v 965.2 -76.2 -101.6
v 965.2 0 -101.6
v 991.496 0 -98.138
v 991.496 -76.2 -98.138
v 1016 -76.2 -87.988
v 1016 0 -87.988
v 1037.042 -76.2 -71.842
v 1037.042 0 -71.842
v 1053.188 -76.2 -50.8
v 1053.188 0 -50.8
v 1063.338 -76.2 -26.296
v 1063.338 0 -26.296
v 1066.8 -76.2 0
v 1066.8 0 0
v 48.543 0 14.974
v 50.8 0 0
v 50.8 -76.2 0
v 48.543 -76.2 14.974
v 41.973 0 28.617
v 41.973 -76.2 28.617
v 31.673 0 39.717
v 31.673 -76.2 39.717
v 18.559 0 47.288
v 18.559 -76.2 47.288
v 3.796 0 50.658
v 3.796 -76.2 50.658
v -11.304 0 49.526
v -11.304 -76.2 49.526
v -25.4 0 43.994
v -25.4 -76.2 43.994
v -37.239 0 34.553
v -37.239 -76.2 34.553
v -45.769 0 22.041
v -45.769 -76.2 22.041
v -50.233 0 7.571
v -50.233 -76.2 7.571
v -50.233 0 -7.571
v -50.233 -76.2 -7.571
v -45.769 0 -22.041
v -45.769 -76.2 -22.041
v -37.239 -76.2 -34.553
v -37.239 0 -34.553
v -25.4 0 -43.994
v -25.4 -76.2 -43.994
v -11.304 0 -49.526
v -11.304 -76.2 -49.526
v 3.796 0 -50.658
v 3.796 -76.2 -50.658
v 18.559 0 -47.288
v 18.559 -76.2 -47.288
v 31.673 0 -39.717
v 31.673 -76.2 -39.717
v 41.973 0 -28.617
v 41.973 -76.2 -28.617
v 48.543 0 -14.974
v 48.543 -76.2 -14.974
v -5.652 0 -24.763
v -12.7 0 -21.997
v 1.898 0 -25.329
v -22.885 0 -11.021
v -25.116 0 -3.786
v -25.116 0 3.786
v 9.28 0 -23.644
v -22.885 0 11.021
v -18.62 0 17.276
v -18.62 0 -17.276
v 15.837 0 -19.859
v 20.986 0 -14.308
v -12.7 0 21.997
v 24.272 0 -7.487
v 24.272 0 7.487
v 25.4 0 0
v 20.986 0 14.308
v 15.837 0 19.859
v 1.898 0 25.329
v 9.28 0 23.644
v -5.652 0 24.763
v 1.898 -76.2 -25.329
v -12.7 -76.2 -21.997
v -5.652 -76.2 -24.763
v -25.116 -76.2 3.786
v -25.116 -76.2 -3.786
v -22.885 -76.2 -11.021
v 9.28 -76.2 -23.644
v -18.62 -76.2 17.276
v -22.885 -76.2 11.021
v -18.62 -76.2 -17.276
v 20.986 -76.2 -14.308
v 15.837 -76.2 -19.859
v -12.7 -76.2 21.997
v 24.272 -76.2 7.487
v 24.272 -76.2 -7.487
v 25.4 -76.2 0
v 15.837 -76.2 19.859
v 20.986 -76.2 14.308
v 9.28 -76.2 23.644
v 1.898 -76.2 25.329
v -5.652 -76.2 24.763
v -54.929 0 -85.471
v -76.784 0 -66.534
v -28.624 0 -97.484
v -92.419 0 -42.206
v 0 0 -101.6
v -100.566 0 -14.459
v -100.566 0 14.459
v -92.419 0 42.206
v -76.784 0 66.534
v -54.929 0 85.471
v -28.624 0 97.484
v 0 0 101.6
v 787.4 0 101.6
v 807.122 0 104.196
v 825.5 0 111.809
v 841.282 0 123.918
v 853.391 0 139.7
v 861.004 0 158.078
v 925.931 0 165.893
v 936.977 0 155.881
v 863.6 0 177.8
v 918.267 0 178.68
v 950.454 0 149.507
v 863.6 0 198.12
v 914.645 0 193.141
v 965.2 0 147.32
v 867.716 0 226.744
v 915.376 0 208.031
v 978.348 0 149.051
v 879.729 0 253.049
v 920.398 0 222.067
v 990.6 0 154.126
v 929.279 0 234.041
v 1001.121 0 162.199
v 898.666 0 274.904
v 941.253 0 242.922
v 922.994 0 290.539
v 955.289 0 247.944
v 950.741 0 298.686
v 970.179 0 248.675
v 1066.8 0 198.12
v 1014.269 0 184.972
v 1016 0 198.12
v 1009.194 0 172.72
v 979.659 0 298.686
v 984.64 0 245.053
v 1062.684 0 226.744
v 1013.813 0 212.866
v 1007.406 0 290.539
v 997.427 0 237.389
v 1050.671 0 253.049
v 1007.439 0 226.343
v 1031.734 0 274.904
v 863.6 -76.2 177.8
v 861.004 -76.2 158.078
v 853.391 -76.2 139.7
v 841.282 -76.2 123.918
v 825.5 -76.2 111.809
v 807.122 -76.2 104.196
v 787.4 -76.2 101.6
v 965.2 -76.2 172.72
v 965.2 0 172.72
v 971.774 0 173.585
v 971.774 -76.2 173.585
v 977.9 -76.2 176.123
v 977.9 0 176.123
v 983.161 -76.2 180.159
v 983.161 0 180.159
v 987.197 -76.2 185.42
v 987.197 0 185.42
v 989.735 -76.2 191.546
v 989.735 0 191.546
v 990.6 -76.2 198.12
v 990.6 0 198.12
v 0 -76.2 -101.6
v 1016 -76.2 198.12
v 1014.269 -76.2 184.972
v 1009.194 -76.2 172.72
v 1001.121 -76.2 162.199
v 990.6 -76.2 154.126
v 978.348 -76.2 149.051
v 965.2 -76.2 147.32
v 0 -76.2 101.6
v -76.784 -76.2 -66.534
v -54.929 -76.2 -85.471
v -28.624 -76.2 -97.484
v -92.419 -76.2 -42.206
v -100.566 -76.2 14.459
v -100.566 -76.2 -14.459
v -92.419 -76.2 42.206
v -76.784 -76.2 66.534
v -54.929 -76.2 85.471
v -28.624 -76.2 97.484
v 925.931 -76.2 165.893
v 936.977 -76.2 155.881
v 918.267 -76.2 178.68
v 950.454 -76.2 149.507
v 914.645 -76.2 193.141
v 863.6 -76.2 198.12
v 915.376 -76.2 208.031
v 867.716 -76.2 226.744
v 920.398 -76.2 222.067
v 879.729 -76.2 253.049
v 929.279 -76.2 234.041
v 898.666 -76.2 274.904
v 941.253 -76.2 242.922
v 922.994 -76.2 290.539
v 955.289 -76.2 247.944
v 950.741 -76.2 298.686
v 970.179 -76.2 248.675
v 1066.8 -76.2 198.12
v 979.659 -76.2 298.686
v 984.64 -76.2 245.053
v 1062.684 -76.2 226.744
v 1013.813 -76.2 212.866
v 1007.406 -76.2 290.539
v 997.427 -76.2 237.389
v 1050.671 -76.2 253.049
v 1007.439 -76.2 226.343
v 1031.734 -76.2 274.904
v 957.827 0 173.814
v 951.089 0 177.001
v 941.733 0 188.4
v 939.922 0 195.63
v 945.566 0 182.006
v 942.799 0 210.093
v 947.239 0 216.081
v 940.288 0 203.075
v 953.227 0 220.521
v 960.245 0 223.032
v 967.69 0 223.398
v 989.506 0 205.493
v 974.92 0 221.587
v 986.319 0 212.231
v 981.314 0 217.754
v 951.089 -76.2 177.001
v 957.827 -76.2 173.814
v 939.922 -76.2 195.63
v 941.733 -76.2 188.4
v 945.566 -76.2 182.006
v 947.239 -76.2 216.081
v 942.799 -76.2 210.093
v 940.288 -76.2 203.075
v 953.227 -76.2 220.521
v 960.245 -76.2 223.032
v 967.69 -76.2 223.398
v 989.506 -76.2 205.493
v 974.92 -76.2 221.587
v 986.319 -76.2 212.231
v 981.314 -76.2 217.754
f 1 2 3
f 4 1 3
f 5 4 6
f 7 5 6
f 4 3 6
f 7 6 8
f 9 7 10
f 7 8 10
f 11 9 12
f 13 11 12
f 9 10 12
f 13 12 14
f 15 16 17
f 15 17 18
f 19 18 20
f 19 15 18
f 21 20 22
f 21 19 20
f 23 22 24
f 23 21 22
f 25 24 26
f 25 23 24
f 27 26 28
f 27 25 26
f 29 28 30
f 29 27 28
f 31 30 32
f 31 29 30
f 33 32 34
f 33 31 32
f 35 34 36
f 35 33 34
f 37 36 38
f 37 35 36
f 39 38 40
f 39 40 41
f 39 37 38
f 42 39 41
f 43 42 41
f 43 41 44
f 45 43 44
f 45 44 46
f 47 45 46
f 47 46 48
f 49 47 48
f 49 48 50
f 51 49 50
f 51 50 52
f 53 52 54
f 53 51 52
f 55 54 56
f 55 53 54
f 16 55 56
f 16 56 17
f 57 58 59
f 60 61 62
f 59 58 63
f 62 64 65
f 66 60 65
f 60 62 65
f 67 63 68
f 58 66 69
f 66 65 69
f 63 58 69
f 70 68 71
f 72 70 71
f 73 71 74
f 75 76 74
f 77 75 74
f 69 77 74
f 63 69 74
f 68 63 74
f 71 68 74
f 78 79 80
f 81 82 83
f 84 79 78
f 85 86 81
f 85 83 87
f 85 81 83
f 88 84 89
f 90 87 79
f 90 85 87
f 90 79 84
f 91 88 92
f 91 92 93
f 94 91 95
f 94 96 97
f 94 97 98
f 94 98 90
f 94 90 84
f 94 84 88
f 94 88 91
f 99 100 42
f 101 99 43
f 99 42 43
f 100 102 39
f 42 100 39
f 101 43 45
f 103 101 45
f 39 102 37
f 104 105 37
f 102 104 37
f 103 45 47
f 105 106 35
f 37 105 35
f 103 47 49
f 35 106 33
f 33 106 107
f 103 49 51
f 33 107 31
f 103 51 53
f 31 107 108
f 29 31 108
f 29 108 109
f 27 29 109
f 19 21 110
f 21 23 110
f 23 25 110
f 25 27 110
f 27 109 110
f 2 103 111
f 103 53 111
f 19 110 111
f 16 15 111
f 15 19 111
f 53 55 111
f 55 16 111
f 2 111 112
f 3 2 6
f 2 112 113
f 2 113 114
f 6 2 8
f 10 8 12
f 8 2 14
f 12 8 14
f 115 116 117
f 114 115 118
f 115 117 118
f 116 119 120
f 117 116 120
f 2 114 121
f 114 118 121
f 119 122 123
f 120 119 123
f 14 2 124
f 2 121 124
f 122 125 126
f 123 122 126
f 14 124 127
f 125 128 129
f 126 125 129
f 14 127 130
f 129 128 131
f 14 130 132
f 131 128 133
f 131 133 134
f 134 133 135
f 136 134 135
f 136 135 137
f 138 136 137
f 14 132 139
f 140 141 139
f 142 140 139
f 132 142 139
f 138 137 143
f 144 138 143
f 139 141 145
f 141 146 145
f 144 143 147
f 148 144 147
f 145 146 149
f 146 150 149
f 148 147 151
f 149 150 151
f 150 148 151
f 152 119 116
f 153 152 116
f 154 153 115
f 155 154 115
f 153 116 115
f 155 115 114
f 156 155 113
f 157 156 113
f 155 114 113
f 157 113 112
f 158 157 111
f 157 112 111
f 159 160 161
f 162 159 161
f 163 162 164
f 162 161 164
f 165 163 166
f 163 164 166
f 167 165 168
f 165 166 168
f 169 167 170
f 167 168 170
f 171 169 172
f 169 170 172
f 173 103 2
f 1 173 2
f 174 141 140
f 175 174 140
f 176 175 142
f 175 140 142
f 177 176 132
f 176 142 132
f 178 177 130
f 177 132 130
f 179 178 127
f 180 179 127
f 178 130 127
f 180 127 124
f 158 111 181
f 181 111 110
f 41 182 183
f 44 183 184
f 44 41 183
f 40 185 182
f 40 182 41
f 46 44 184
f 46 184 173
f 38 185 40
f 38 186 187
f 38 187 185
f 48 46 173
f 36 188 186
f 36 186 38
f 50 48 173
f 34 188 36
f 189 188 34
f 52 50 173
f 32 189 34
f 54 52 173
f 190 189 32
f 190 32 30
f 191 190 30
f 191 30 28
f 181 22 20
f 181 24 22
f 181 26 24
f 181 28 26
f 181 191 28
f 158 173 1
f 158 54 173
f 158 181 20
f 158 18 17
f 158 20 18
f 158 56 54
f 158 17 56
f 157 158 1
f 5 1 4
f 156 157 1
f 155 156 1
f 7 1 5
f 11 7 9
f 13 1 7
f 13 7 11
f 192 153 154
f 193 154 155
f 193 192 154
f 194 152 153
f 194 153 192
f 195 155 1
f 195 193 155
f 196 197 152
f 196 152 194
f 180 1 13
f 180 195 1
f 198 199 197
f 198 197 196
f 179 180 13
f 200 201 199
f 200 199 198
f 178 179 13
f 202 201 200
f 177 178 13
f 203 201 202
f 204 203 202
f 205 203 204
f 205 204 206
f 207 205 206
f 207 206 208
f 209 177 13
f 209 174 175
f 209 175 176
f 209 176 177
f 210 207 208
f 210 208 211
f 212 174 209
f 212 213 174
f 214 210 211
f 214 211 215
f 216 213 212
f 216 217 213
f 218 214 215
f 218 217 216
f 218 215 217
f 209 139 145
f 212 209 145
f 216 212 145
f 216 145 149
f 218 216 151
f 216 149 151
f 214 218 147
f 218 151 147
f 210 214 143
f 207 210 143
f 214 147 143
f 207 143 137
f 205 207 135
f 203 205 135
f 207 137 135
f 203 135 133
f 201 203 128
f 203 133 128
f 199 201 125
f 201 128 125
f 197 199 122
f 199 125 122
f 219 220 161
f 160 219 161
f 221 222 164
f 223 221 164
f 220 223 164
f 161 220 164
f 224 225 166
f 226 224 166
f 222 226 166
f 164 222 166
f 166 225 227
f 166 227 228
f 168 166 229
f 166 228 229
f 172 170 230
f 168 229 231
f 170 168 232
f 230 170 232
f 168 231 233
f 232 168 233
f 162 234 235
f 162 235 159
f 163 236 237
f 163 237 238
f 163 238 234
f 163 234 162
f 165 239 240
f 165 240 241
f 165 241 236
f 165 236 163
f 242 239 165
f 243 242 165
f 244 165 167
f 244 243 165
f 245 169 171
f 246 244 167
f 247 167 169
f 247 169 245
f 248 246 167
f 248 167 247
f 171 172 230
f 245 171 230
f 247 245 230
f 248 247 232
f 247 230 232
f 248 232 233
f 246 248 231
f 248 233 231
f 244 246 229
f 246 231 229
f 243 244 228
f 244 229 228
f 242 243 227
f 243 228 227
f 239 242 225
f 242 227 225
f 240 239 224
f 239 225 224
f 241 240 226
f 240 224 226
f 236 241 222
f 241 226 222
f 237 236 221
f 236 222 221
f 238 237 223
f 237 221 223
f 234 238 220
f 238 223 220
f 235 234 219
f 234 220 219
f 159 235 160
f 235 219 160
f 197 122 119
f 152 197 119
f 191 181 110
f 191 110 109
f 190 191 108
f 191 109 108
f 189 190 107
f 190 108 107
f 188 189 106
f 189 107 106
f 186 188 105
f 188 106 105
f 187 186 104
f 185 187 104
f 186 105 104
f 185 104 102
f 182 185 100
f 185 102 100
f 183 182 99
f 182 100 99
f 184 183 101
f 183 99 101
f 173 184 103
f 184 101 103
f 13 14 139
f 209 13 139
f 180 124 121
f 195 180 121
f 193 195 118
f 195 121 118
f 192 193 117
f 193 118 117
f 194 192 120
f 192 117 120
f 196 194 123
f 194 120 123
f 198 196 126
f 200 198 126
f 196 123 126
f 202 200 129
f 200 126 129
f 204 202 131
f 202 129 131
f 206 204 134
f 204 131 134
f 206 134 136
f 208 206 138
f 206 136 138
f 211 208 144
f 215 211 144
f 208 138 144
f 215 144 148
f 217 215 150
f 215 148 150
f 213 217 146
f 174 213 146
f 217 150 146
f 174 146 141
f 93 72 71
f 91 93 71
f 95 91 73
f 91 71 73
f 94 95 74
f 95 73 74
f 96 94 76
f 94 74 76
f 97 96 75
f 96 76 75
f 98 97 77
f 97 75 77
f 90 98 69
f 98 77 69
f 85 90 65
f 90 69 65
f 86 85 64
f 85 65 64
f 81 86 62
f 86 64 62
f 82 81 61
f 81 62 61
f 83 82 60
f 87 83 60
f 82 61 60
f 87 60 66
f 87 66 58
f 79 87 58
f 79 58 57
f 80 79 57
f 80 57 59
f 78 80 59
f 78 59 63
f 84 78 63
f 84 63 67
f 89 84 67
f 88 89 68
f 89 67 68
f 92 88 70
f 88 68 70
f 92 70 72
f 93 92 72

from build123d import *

# Parameters (mm, degrees)
F0_R     = 50.8
F1_DEPTH = 76.2
F0_R_2   = 25.4


with BuildPart() as f1:
    # F0 (on Front) → F1 (new body)
    with BuildSketch(Plane.XZ):
        with BuildLine():
            Line((787.4, 101.6), (0, 101.6))
            ThreePointArc((0, 101.6), (-101.6, 0), (0, -101.6))
            Line((0, -101.6), (965.2, -101.6))
            ThreePointArc((965.2, -101.6), (1037.0420489686, -71.8420489686), (1066.8, 0))
            Line((1066.8, 0), (1066.8, 198.12))
            ThreePointArc((1066.8, 198.12), (965.2, 299.72), (863.6, 198.12))
            Line((863.6, 198.12), (863.6, 177.8))
            ThreePointArc((863.6, 177.8), (841.2815367264, 123.9184632736), (787.4, 101.6))
        make_face()
        Circle(F0_R, mode=Mode.SUBTRACT)
        with BuildLine():
            ThreePointArc((965.2, 50.8), (1001.1210244843, 35.9210244843), (1016, 0))
            ThreePointArc((1016, 0), (929.2789755157, -35.9210244843), (965.2, 50.8))
        make_face(mode=Mode.SUBTRACT)
        with BuildLine():
            ThreePointArc((1016, 198.12), (1001.1210244843, 162.1989755157), (965.2, 147.32))
            ThreePointArc((965.2, 147.32), (929.2789755157, 234.0410244843), (1016, 198.12))
        make_face(mode=Mode.SUBTRACT)
        with BuildLine():
            ThreePointArc((965.2, 50.8), (929.2789755157, -35.9210244843), (1016, 0))
            ThreePointArc((1016, 0), (1001.1210244843, 35.9210244843), (965.2, 50.8))
        make_face()
        with BuildLine():
            ThreePointArc((990.6, 0), (947.2394877579, -17.9605122421), (965.2, 25.4))
            ThreePointArc((965.2, 25.4), (983.1605122421, 17.9605122421), (990.6, 0))
        make_face(mode=Mode.SUBTRACT)
        with BuildLine():
            ThreePointArc((990.6, 0), (983.1605122421, 17.9605122421), (965.2, 25.4))
            ThreePointArc((965.2, 25.4), (947.2394877579, -17.9605122421), (990.6, 0))
        make_face()
    extrude(amount=F1_DEPTH)


with BuildPart() as f1b:
    # F0 (on Front) → F1, piece 2 (new body)
    with BuildSketch(Plane.XZ):
        Circle(F0_R_2)
    extrude(amount=F1_DEPTH)


with BuildPart() as f1c:
    # F0 (on Front) → F1, piece 3 (new body)
    with BuildSketch(Plane.XZ):
        with BuildLine():
            ThreePointArc((990.6, 198.12), (947.2394877579, 216.0805122421), (965.2, 172.72))
            ThreePointArc((965.2, 172.72), (983.1605122421, 180.1594877579), (990.6, 198.12))
        make_face()
    extrude(amount=F1_DEPTH)


solid = Compound([f1.part, f1b.part, f1c.part])
